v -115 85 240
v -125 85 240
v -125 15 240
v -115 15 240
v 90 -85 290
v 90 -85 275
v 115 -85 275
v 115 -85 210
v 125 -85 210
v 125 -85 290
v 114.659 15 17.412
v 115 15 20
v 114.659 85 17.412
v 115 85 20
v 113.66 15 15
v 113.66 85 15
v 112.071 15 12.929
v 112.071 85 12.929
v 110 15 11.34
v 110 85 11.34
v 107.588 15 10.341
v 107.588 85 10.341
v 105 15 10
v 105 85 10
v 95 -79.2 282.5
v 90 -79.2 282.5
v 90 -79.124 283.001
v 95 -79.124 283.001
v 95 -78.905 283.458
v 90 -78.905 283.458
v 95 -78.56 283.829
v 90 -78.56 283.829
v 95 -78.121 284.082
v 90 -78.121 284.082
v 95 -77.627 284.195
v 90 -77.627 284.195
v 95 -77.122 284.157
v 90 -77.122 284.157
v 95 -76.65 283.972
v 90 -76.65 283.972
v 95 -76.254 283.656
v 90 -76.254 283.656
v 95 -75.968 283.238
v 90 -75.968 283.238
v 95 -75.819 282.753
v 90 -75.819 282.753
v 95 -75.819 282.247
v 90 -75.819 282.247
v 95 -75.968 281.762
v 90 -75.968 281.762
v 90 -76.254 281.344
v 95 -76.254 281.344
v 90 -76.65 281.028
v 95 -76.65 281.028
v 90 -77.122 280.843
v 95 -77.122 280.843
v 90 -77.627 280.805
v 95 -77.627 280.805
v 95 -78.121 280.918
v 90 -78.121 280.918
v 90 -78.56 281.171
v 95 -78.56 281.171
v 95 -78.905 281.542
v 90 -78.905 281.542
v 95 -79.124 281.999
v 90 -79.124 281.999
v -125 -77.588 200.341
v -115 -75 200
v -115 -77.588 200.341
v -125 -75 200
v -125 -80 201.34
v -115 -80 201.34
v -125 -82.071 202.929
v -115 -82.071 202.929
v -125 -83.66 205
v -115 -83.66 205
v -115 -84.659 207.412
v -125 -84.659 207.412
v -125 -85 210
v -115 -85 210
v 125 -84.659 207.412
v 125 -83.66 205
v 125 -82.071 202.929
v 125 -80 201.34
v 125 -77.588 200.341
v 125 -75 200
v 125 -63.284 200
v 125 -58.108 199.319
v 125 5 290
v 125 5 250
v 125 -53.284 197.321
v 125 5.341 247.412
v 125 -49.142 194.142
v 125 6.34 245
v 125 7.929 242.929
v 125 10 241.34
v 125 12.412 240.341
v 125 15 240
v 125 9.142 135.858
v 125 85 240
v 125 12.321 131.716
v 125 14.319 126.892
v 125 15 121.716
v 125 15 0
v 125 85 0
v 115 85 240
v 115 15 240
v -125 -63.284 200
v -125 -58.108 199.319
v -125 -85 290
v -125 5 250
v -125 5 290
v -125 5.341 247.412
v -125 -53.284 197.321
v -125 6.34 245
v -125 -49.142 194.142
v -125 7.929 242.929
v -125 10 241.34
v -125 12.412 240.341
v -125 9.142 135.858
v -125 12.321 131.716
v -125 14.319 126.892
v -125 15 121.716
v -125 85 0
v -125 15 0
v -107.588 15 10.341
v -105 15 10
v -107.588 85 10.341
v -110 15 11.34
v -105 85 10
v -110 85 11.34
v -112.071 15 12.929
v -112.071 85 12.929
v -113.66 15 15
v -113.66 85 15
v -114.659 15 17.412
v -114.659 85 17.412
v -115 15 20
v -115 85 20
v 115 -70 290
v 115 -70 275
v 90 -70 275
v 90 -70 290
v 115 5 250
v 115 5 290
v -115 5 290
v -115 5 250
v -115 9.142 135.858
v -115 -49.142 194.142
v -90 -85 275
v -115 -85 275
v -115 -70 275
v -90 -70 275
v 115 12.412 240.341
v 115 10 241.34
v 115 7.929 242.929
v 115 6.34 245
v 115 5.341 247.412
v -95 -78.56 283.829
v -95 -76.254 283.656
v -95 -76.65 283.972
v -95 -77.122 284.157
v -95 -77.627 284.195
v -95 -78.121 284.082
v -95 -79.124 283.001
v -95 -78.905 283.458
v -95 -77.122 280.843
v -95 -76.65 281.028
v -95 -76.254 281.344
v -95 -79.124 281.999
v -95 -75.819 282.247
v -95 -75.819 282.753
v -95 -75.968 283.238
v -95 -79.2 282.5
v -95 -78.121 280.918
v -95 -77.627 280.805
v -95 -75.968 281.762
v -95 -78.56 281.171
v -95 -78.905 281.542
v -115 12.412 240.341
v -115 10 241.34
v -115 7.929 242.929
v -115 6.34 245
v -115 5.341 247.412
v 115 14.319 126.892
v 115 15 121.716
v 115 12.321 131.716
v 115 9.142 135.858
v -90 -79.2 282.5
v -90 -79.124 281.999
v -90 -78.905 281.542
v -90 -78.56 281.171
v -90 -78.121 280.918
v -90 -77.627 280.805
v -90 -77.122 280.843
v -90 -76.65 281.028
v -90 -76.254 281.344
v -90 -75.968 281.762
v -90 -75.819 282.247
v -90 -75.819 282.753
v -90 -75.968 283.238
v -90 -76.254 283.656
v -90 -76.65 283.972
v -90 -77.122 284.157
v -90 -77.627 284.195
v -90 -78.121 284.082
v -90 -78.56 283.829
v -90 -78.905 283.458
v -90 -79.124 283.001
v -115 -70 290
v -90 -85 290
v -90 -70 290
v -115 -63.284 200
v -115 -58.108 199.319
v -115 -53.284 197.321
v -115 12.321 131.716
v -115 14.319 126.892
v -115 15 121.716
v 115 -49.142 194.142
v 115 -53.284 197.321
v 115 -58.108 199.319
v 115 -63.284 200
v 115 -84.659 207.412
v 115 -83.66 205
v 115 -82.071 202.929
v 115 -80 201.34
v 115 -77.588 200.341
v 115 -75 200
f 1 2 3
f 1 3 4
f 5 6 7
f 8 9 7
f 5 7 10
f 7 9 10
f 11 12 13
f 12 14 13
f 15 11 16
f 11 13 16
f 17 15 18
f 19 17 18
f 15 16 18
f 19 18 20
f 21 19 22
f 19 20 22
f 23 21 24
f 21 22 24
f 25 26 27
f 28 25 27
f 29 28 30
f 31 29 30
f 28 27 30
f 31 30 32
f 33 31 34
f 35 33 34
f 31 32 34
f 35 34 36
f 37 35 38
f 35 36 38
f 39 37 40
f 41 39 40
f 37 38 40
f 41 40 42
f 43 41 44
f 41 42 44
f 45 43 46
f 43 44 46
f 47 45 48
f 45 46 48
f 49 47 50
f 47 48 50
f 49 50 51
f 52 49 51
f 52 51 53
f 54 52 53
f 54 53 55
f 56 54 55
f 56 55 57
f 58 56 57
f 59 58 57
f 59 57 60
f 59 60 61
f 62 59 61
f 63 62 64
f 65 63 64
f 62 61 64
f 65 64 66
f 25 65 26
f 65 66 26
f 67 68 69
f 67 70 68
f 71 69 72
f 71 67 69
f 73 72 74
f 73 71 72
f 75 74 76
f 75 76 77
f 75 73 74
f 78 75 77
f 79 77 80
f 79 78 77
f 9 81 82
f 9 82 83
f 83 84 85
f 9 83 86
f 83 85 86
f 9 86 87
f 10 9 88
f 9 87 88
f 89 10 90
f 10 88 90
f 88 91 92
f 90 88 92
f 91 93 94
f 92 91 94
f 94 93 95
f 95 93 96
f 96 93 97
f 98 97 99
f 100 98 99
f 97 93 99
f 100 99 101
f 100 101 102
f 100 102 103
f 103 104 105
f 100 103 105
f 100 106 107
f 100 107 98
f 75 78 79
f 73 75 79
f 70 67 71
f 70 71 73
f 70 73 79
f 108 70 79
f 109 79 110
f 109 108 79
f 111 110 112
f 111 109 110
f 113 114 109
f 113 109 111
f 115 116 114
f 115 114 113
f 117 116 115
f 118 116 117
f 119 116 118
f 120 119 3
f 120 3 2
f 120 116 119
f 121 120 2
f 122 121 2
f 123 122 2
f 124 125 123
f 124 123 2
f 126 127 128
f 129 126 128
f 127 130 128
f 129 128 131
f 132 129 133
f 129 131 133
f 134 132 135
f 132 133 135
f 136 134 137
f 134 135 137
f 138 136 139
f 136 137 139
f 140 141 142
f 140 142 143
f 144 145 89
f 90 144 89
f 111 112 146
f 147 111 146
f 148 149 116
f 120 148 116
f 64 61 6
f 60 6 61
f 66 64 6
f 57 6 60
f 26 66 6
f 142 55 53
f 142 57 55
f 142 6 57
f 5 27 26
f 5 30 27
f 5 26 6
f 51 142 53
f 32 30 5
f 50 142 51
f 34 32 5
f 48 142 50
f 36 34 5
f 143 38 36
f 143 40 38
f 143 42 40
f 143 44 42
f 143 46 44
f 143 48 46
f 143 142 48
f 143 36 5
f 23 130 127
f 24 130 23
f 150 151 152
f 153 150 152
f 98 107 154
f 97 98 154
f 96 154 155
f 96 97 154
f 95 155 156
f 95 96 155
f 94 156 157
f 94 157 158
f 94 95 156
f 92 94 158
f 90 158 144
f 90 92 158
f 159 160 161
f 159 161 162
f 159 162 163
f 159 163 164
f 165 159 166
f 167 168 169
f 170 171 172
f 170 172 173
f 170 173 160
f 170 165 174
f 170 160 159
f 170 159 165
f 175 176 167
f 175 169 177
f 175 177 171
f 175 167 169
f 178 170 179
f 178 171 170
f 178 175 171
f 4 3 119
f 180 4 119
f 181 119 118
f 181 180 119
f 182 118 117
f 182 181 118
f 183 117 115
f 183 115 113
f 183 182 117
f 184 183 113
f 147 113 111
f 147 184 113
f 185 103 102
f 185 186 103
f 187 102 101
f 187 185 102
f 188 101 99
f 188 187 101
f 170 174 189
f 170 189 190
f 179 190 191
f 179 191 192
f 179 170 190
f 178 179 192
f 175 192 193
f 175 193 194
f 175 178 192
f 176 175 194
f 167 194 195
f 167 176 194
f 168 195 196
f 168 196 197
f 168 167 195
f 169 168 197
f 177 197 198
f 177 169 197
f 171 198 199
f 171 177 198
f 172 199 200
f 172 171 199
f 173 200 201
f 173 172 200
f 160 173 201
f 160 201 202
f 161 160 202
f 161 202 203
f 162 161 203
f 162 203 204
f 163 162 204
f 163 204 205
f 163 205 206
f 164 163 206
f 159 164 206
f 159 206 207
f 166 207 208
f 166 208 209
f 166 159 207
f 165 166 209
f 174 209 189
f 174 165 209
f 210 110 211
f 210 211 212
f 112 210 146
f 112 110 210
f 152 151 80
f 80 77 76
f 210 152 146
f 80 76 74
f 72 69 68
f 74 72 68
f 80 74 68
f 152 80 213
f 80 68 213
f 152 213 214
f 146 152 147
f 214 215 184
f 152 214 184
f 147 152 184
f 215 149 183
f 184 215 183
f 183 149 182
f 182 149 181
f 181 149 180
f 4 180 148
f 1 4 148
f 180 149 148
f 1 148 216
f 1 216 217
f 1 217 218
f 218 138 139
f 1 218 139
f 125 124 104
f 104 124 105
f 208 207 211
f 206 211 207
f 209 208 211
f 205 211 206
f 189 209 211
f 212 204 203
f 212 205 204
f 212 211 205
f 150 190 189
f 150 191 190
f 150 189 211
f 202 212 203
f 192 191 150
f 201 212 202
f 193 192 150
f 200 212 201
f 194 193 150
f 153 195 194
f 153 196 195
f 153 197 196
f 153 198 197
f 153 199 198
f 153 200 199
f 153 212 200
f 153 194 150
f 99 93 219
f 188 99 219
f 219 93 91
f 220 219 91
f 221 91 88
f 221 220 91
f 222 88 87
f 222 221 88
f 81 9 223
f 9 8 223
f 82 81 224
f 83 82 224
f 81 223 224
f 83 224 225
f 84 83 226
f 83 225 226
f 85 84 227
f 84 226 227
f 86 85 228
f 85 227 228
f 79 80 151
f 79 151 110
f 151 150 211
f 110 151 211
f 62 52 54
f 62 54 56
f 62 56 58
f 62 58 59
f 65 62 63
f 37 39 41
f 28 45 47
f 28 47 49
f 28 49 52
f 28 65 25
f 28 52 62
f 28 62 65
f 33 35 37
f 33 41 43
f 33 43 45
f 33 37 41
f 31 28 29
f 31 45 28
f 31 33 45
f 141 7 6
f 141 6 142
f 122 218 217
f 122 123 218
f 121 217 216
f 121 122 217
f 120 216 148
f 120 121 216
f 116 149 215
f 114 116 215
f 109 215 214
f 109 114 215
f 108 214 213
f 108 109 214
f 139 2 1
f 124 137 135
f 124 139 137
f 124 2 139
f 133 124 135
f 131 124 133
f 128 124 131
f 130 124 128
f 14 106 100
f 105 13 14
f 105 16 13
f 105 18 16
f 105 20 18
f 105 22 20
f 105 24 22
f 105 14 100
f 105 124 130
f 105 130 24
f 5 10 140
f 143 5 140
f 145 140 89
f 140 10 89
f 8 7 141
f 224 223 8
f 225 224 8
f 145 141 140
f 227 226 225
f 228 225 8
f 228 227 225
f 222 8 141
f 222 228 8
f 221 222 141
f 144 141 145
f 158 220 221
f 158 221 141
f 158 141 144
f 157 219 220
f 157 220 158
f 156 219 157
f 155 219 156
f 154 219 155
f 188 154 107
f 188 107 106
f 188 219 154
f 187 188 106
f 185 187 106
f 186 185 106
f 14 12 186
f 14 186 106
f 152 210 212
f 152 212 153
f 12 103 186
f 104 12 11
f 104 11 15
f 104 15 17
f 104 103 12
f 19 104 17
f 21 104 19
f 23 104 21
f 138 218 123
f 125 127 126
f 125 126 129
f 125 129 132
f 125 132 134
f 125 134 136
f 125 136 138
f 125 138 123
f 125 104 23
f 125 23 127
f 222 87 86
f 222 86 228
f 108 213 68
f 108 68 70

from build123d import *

# Parameters (mm, degrees)
SKETCH_1_W          = 250
SKETCH_1_H          = 170
EXTRUDE_1_DEPTH     = 10
SKETCH_2_W          = 10
SKETCH_2_H          = 170
EXTRUDE_2_DEPTH     = 280
SKETCH_3_W          = 15
SKETCH_3_H          = 15
EXTRUDE_3_DEPTH     = 25
SKETCH_4_W          = 15
SKETCH_4_H          = 15
EXTRUDE_4_DEPTH     = 25
SKETCH_5_R          = 1.7
CUT_EXTRUDE_1_DEPTH = 5
CUT_EXTRUDE_START   = -5
SKETCH_6_R          = 1.7
CUT_EXTRUDE_2_DEPTH = 5
SKETCH_7_W          = 250
SKETCH_7_H          = 100
CUT_EXTRUDE_3_DEPTH = 200
SKETCH_8_W          = 250
SKETCH_8_H          = 80
CUT_EXTRUDE_4_DEPTH = 50
FILLET_1_R          = 10
CHAMFER_2_SIZE      = 70
FILLET_3_R          = 20


with BuildPart() as part:
    # 草图1 → 凸台-拉伸1 (new body)
    with BuildSketch(Plane.XY):
        Rectangle(SKETCH_1_W, SKETCH_1_H)
    extrude(amount=EXTRUDE_1_DEPTH)

    # 草图2 → 凸台-拉伸2 (add)
    with BuildSketch(Plane.XY.offset(10)):
        with Locations((-120, 0)):
            Rectangle(SKETCH_2_W, SKETCH_2_H)
        with Locations((120, 0)):
            Rectangle(SKETCH_2_W, SKETCH_2_H)
    extrude(amount=EXTRUDE_2_DEPTH)

    # 草图3 → 凸台-拉伸3 (add)
    with BuildSketch(Plane(origin=(-115, 0, 0), x_dir=(0, 0, -1), z_dir=(1, 0, 0))):
        with Locations((-282.5, -77.5)):
            Rectangle(SKETCH_3_W, SKETCH_3_H)
    extrude(amount=EXTRUDE_3_DEPTH)

    # 草图4 → 凸台-拉伸4 (add)
    with BuildSketch(Plane.ZY.offset(-115)):
        with Locations((282.5, -77.5)):
            Rectangle(SKETCH_4_W, SKETCH_4_H)
    extrude(amount=EXTRUDE_4_DEPTH)

    # 草图5 → 切除-拉伸1 (cut)
    with BuildSketch(Plane.ZY.offset(-90)):
        with Locations(Location((282.5, -77.5, 0), (0, 0, 270))):
            Circle(SKETCH_5_R)
    extrude(amount=-CUT_EXTRUDE_1_DEPTH, mode=Mode.SUBTRACT)

    # 草图6 → 切除-拉伸2 (cut)
    with BuildSketch(Plane(origin=(-90, 0, 0), x_dir=(0, 0, -1), z_dir=(1, 0, 0)).offset(CUT_EXTRUDE_START)):
        with Locations(Location((-282.5, -77.5, 0), (0, 0, 270))):
            Circle(SKETCH_6_R)
    extrude(amount=CUT_EXTRUDE_2_DEPTH, mode=Mode.SUBTRACT)

    # 草图7 → 切除-拉伸3 (cut)
    with BuildSketch(Plane(origin=(0, 0, 0), x_dir=(-1, 0, 0), z_dir=(0, 0, -1))):
        with Locations((0, -35)):
            Rectangle(SKETCH_7_W, SKETCH_7_H)
    extrude(amount=-CUT_EXTRUDE_3_DEPTH, mode=Mode.SUBTRACT)

    # 草图8 → 切除-拉伸4 (cut)
    with BuildSketch(Plane.XY.offset(290)):
        with Locations((0, 45)):
            Rectangle(SKETCH_8_W, SKETCH_8_H)
    extrude(amount=-CUT_EXTRUDE_4_DEPTH, mode=Mode.SUBTRACT)

    # 圆角1
    fillet_1_edges = [part.edges().sort_by_distance(p)[0] for p in [
        (120, 5, 240),
        (-120, 5, 240),
        (115, 50, 10),
        (-115, 50, 10),
        (120, -85, 200),
        (-120, -85, 200),
    ]]
    fillet(fillet_1_edges, radius=FILLET_1_R)

    # 倒角2
    chamfer_2_edges = [part.edges().sort_by_distance(p)[0] for p in [
        (120, 15, 200),
        (-120, 15, 200),
    ]]
    chamfer(chamfer_2_edges, length=CHAMFER_2_SIZE)

    # 圆角3
    fillet_3_edges = [part.edges().sort_by_distance(p)[0] for p in [
        (120, -55, 200),
        (-120, 15, 130),
        (120, 15, 130),
        (-120, -55, 200),
    ]]
    fillet(fillet_3_edges, radius=FILLET_3_R)


solid = part.part
